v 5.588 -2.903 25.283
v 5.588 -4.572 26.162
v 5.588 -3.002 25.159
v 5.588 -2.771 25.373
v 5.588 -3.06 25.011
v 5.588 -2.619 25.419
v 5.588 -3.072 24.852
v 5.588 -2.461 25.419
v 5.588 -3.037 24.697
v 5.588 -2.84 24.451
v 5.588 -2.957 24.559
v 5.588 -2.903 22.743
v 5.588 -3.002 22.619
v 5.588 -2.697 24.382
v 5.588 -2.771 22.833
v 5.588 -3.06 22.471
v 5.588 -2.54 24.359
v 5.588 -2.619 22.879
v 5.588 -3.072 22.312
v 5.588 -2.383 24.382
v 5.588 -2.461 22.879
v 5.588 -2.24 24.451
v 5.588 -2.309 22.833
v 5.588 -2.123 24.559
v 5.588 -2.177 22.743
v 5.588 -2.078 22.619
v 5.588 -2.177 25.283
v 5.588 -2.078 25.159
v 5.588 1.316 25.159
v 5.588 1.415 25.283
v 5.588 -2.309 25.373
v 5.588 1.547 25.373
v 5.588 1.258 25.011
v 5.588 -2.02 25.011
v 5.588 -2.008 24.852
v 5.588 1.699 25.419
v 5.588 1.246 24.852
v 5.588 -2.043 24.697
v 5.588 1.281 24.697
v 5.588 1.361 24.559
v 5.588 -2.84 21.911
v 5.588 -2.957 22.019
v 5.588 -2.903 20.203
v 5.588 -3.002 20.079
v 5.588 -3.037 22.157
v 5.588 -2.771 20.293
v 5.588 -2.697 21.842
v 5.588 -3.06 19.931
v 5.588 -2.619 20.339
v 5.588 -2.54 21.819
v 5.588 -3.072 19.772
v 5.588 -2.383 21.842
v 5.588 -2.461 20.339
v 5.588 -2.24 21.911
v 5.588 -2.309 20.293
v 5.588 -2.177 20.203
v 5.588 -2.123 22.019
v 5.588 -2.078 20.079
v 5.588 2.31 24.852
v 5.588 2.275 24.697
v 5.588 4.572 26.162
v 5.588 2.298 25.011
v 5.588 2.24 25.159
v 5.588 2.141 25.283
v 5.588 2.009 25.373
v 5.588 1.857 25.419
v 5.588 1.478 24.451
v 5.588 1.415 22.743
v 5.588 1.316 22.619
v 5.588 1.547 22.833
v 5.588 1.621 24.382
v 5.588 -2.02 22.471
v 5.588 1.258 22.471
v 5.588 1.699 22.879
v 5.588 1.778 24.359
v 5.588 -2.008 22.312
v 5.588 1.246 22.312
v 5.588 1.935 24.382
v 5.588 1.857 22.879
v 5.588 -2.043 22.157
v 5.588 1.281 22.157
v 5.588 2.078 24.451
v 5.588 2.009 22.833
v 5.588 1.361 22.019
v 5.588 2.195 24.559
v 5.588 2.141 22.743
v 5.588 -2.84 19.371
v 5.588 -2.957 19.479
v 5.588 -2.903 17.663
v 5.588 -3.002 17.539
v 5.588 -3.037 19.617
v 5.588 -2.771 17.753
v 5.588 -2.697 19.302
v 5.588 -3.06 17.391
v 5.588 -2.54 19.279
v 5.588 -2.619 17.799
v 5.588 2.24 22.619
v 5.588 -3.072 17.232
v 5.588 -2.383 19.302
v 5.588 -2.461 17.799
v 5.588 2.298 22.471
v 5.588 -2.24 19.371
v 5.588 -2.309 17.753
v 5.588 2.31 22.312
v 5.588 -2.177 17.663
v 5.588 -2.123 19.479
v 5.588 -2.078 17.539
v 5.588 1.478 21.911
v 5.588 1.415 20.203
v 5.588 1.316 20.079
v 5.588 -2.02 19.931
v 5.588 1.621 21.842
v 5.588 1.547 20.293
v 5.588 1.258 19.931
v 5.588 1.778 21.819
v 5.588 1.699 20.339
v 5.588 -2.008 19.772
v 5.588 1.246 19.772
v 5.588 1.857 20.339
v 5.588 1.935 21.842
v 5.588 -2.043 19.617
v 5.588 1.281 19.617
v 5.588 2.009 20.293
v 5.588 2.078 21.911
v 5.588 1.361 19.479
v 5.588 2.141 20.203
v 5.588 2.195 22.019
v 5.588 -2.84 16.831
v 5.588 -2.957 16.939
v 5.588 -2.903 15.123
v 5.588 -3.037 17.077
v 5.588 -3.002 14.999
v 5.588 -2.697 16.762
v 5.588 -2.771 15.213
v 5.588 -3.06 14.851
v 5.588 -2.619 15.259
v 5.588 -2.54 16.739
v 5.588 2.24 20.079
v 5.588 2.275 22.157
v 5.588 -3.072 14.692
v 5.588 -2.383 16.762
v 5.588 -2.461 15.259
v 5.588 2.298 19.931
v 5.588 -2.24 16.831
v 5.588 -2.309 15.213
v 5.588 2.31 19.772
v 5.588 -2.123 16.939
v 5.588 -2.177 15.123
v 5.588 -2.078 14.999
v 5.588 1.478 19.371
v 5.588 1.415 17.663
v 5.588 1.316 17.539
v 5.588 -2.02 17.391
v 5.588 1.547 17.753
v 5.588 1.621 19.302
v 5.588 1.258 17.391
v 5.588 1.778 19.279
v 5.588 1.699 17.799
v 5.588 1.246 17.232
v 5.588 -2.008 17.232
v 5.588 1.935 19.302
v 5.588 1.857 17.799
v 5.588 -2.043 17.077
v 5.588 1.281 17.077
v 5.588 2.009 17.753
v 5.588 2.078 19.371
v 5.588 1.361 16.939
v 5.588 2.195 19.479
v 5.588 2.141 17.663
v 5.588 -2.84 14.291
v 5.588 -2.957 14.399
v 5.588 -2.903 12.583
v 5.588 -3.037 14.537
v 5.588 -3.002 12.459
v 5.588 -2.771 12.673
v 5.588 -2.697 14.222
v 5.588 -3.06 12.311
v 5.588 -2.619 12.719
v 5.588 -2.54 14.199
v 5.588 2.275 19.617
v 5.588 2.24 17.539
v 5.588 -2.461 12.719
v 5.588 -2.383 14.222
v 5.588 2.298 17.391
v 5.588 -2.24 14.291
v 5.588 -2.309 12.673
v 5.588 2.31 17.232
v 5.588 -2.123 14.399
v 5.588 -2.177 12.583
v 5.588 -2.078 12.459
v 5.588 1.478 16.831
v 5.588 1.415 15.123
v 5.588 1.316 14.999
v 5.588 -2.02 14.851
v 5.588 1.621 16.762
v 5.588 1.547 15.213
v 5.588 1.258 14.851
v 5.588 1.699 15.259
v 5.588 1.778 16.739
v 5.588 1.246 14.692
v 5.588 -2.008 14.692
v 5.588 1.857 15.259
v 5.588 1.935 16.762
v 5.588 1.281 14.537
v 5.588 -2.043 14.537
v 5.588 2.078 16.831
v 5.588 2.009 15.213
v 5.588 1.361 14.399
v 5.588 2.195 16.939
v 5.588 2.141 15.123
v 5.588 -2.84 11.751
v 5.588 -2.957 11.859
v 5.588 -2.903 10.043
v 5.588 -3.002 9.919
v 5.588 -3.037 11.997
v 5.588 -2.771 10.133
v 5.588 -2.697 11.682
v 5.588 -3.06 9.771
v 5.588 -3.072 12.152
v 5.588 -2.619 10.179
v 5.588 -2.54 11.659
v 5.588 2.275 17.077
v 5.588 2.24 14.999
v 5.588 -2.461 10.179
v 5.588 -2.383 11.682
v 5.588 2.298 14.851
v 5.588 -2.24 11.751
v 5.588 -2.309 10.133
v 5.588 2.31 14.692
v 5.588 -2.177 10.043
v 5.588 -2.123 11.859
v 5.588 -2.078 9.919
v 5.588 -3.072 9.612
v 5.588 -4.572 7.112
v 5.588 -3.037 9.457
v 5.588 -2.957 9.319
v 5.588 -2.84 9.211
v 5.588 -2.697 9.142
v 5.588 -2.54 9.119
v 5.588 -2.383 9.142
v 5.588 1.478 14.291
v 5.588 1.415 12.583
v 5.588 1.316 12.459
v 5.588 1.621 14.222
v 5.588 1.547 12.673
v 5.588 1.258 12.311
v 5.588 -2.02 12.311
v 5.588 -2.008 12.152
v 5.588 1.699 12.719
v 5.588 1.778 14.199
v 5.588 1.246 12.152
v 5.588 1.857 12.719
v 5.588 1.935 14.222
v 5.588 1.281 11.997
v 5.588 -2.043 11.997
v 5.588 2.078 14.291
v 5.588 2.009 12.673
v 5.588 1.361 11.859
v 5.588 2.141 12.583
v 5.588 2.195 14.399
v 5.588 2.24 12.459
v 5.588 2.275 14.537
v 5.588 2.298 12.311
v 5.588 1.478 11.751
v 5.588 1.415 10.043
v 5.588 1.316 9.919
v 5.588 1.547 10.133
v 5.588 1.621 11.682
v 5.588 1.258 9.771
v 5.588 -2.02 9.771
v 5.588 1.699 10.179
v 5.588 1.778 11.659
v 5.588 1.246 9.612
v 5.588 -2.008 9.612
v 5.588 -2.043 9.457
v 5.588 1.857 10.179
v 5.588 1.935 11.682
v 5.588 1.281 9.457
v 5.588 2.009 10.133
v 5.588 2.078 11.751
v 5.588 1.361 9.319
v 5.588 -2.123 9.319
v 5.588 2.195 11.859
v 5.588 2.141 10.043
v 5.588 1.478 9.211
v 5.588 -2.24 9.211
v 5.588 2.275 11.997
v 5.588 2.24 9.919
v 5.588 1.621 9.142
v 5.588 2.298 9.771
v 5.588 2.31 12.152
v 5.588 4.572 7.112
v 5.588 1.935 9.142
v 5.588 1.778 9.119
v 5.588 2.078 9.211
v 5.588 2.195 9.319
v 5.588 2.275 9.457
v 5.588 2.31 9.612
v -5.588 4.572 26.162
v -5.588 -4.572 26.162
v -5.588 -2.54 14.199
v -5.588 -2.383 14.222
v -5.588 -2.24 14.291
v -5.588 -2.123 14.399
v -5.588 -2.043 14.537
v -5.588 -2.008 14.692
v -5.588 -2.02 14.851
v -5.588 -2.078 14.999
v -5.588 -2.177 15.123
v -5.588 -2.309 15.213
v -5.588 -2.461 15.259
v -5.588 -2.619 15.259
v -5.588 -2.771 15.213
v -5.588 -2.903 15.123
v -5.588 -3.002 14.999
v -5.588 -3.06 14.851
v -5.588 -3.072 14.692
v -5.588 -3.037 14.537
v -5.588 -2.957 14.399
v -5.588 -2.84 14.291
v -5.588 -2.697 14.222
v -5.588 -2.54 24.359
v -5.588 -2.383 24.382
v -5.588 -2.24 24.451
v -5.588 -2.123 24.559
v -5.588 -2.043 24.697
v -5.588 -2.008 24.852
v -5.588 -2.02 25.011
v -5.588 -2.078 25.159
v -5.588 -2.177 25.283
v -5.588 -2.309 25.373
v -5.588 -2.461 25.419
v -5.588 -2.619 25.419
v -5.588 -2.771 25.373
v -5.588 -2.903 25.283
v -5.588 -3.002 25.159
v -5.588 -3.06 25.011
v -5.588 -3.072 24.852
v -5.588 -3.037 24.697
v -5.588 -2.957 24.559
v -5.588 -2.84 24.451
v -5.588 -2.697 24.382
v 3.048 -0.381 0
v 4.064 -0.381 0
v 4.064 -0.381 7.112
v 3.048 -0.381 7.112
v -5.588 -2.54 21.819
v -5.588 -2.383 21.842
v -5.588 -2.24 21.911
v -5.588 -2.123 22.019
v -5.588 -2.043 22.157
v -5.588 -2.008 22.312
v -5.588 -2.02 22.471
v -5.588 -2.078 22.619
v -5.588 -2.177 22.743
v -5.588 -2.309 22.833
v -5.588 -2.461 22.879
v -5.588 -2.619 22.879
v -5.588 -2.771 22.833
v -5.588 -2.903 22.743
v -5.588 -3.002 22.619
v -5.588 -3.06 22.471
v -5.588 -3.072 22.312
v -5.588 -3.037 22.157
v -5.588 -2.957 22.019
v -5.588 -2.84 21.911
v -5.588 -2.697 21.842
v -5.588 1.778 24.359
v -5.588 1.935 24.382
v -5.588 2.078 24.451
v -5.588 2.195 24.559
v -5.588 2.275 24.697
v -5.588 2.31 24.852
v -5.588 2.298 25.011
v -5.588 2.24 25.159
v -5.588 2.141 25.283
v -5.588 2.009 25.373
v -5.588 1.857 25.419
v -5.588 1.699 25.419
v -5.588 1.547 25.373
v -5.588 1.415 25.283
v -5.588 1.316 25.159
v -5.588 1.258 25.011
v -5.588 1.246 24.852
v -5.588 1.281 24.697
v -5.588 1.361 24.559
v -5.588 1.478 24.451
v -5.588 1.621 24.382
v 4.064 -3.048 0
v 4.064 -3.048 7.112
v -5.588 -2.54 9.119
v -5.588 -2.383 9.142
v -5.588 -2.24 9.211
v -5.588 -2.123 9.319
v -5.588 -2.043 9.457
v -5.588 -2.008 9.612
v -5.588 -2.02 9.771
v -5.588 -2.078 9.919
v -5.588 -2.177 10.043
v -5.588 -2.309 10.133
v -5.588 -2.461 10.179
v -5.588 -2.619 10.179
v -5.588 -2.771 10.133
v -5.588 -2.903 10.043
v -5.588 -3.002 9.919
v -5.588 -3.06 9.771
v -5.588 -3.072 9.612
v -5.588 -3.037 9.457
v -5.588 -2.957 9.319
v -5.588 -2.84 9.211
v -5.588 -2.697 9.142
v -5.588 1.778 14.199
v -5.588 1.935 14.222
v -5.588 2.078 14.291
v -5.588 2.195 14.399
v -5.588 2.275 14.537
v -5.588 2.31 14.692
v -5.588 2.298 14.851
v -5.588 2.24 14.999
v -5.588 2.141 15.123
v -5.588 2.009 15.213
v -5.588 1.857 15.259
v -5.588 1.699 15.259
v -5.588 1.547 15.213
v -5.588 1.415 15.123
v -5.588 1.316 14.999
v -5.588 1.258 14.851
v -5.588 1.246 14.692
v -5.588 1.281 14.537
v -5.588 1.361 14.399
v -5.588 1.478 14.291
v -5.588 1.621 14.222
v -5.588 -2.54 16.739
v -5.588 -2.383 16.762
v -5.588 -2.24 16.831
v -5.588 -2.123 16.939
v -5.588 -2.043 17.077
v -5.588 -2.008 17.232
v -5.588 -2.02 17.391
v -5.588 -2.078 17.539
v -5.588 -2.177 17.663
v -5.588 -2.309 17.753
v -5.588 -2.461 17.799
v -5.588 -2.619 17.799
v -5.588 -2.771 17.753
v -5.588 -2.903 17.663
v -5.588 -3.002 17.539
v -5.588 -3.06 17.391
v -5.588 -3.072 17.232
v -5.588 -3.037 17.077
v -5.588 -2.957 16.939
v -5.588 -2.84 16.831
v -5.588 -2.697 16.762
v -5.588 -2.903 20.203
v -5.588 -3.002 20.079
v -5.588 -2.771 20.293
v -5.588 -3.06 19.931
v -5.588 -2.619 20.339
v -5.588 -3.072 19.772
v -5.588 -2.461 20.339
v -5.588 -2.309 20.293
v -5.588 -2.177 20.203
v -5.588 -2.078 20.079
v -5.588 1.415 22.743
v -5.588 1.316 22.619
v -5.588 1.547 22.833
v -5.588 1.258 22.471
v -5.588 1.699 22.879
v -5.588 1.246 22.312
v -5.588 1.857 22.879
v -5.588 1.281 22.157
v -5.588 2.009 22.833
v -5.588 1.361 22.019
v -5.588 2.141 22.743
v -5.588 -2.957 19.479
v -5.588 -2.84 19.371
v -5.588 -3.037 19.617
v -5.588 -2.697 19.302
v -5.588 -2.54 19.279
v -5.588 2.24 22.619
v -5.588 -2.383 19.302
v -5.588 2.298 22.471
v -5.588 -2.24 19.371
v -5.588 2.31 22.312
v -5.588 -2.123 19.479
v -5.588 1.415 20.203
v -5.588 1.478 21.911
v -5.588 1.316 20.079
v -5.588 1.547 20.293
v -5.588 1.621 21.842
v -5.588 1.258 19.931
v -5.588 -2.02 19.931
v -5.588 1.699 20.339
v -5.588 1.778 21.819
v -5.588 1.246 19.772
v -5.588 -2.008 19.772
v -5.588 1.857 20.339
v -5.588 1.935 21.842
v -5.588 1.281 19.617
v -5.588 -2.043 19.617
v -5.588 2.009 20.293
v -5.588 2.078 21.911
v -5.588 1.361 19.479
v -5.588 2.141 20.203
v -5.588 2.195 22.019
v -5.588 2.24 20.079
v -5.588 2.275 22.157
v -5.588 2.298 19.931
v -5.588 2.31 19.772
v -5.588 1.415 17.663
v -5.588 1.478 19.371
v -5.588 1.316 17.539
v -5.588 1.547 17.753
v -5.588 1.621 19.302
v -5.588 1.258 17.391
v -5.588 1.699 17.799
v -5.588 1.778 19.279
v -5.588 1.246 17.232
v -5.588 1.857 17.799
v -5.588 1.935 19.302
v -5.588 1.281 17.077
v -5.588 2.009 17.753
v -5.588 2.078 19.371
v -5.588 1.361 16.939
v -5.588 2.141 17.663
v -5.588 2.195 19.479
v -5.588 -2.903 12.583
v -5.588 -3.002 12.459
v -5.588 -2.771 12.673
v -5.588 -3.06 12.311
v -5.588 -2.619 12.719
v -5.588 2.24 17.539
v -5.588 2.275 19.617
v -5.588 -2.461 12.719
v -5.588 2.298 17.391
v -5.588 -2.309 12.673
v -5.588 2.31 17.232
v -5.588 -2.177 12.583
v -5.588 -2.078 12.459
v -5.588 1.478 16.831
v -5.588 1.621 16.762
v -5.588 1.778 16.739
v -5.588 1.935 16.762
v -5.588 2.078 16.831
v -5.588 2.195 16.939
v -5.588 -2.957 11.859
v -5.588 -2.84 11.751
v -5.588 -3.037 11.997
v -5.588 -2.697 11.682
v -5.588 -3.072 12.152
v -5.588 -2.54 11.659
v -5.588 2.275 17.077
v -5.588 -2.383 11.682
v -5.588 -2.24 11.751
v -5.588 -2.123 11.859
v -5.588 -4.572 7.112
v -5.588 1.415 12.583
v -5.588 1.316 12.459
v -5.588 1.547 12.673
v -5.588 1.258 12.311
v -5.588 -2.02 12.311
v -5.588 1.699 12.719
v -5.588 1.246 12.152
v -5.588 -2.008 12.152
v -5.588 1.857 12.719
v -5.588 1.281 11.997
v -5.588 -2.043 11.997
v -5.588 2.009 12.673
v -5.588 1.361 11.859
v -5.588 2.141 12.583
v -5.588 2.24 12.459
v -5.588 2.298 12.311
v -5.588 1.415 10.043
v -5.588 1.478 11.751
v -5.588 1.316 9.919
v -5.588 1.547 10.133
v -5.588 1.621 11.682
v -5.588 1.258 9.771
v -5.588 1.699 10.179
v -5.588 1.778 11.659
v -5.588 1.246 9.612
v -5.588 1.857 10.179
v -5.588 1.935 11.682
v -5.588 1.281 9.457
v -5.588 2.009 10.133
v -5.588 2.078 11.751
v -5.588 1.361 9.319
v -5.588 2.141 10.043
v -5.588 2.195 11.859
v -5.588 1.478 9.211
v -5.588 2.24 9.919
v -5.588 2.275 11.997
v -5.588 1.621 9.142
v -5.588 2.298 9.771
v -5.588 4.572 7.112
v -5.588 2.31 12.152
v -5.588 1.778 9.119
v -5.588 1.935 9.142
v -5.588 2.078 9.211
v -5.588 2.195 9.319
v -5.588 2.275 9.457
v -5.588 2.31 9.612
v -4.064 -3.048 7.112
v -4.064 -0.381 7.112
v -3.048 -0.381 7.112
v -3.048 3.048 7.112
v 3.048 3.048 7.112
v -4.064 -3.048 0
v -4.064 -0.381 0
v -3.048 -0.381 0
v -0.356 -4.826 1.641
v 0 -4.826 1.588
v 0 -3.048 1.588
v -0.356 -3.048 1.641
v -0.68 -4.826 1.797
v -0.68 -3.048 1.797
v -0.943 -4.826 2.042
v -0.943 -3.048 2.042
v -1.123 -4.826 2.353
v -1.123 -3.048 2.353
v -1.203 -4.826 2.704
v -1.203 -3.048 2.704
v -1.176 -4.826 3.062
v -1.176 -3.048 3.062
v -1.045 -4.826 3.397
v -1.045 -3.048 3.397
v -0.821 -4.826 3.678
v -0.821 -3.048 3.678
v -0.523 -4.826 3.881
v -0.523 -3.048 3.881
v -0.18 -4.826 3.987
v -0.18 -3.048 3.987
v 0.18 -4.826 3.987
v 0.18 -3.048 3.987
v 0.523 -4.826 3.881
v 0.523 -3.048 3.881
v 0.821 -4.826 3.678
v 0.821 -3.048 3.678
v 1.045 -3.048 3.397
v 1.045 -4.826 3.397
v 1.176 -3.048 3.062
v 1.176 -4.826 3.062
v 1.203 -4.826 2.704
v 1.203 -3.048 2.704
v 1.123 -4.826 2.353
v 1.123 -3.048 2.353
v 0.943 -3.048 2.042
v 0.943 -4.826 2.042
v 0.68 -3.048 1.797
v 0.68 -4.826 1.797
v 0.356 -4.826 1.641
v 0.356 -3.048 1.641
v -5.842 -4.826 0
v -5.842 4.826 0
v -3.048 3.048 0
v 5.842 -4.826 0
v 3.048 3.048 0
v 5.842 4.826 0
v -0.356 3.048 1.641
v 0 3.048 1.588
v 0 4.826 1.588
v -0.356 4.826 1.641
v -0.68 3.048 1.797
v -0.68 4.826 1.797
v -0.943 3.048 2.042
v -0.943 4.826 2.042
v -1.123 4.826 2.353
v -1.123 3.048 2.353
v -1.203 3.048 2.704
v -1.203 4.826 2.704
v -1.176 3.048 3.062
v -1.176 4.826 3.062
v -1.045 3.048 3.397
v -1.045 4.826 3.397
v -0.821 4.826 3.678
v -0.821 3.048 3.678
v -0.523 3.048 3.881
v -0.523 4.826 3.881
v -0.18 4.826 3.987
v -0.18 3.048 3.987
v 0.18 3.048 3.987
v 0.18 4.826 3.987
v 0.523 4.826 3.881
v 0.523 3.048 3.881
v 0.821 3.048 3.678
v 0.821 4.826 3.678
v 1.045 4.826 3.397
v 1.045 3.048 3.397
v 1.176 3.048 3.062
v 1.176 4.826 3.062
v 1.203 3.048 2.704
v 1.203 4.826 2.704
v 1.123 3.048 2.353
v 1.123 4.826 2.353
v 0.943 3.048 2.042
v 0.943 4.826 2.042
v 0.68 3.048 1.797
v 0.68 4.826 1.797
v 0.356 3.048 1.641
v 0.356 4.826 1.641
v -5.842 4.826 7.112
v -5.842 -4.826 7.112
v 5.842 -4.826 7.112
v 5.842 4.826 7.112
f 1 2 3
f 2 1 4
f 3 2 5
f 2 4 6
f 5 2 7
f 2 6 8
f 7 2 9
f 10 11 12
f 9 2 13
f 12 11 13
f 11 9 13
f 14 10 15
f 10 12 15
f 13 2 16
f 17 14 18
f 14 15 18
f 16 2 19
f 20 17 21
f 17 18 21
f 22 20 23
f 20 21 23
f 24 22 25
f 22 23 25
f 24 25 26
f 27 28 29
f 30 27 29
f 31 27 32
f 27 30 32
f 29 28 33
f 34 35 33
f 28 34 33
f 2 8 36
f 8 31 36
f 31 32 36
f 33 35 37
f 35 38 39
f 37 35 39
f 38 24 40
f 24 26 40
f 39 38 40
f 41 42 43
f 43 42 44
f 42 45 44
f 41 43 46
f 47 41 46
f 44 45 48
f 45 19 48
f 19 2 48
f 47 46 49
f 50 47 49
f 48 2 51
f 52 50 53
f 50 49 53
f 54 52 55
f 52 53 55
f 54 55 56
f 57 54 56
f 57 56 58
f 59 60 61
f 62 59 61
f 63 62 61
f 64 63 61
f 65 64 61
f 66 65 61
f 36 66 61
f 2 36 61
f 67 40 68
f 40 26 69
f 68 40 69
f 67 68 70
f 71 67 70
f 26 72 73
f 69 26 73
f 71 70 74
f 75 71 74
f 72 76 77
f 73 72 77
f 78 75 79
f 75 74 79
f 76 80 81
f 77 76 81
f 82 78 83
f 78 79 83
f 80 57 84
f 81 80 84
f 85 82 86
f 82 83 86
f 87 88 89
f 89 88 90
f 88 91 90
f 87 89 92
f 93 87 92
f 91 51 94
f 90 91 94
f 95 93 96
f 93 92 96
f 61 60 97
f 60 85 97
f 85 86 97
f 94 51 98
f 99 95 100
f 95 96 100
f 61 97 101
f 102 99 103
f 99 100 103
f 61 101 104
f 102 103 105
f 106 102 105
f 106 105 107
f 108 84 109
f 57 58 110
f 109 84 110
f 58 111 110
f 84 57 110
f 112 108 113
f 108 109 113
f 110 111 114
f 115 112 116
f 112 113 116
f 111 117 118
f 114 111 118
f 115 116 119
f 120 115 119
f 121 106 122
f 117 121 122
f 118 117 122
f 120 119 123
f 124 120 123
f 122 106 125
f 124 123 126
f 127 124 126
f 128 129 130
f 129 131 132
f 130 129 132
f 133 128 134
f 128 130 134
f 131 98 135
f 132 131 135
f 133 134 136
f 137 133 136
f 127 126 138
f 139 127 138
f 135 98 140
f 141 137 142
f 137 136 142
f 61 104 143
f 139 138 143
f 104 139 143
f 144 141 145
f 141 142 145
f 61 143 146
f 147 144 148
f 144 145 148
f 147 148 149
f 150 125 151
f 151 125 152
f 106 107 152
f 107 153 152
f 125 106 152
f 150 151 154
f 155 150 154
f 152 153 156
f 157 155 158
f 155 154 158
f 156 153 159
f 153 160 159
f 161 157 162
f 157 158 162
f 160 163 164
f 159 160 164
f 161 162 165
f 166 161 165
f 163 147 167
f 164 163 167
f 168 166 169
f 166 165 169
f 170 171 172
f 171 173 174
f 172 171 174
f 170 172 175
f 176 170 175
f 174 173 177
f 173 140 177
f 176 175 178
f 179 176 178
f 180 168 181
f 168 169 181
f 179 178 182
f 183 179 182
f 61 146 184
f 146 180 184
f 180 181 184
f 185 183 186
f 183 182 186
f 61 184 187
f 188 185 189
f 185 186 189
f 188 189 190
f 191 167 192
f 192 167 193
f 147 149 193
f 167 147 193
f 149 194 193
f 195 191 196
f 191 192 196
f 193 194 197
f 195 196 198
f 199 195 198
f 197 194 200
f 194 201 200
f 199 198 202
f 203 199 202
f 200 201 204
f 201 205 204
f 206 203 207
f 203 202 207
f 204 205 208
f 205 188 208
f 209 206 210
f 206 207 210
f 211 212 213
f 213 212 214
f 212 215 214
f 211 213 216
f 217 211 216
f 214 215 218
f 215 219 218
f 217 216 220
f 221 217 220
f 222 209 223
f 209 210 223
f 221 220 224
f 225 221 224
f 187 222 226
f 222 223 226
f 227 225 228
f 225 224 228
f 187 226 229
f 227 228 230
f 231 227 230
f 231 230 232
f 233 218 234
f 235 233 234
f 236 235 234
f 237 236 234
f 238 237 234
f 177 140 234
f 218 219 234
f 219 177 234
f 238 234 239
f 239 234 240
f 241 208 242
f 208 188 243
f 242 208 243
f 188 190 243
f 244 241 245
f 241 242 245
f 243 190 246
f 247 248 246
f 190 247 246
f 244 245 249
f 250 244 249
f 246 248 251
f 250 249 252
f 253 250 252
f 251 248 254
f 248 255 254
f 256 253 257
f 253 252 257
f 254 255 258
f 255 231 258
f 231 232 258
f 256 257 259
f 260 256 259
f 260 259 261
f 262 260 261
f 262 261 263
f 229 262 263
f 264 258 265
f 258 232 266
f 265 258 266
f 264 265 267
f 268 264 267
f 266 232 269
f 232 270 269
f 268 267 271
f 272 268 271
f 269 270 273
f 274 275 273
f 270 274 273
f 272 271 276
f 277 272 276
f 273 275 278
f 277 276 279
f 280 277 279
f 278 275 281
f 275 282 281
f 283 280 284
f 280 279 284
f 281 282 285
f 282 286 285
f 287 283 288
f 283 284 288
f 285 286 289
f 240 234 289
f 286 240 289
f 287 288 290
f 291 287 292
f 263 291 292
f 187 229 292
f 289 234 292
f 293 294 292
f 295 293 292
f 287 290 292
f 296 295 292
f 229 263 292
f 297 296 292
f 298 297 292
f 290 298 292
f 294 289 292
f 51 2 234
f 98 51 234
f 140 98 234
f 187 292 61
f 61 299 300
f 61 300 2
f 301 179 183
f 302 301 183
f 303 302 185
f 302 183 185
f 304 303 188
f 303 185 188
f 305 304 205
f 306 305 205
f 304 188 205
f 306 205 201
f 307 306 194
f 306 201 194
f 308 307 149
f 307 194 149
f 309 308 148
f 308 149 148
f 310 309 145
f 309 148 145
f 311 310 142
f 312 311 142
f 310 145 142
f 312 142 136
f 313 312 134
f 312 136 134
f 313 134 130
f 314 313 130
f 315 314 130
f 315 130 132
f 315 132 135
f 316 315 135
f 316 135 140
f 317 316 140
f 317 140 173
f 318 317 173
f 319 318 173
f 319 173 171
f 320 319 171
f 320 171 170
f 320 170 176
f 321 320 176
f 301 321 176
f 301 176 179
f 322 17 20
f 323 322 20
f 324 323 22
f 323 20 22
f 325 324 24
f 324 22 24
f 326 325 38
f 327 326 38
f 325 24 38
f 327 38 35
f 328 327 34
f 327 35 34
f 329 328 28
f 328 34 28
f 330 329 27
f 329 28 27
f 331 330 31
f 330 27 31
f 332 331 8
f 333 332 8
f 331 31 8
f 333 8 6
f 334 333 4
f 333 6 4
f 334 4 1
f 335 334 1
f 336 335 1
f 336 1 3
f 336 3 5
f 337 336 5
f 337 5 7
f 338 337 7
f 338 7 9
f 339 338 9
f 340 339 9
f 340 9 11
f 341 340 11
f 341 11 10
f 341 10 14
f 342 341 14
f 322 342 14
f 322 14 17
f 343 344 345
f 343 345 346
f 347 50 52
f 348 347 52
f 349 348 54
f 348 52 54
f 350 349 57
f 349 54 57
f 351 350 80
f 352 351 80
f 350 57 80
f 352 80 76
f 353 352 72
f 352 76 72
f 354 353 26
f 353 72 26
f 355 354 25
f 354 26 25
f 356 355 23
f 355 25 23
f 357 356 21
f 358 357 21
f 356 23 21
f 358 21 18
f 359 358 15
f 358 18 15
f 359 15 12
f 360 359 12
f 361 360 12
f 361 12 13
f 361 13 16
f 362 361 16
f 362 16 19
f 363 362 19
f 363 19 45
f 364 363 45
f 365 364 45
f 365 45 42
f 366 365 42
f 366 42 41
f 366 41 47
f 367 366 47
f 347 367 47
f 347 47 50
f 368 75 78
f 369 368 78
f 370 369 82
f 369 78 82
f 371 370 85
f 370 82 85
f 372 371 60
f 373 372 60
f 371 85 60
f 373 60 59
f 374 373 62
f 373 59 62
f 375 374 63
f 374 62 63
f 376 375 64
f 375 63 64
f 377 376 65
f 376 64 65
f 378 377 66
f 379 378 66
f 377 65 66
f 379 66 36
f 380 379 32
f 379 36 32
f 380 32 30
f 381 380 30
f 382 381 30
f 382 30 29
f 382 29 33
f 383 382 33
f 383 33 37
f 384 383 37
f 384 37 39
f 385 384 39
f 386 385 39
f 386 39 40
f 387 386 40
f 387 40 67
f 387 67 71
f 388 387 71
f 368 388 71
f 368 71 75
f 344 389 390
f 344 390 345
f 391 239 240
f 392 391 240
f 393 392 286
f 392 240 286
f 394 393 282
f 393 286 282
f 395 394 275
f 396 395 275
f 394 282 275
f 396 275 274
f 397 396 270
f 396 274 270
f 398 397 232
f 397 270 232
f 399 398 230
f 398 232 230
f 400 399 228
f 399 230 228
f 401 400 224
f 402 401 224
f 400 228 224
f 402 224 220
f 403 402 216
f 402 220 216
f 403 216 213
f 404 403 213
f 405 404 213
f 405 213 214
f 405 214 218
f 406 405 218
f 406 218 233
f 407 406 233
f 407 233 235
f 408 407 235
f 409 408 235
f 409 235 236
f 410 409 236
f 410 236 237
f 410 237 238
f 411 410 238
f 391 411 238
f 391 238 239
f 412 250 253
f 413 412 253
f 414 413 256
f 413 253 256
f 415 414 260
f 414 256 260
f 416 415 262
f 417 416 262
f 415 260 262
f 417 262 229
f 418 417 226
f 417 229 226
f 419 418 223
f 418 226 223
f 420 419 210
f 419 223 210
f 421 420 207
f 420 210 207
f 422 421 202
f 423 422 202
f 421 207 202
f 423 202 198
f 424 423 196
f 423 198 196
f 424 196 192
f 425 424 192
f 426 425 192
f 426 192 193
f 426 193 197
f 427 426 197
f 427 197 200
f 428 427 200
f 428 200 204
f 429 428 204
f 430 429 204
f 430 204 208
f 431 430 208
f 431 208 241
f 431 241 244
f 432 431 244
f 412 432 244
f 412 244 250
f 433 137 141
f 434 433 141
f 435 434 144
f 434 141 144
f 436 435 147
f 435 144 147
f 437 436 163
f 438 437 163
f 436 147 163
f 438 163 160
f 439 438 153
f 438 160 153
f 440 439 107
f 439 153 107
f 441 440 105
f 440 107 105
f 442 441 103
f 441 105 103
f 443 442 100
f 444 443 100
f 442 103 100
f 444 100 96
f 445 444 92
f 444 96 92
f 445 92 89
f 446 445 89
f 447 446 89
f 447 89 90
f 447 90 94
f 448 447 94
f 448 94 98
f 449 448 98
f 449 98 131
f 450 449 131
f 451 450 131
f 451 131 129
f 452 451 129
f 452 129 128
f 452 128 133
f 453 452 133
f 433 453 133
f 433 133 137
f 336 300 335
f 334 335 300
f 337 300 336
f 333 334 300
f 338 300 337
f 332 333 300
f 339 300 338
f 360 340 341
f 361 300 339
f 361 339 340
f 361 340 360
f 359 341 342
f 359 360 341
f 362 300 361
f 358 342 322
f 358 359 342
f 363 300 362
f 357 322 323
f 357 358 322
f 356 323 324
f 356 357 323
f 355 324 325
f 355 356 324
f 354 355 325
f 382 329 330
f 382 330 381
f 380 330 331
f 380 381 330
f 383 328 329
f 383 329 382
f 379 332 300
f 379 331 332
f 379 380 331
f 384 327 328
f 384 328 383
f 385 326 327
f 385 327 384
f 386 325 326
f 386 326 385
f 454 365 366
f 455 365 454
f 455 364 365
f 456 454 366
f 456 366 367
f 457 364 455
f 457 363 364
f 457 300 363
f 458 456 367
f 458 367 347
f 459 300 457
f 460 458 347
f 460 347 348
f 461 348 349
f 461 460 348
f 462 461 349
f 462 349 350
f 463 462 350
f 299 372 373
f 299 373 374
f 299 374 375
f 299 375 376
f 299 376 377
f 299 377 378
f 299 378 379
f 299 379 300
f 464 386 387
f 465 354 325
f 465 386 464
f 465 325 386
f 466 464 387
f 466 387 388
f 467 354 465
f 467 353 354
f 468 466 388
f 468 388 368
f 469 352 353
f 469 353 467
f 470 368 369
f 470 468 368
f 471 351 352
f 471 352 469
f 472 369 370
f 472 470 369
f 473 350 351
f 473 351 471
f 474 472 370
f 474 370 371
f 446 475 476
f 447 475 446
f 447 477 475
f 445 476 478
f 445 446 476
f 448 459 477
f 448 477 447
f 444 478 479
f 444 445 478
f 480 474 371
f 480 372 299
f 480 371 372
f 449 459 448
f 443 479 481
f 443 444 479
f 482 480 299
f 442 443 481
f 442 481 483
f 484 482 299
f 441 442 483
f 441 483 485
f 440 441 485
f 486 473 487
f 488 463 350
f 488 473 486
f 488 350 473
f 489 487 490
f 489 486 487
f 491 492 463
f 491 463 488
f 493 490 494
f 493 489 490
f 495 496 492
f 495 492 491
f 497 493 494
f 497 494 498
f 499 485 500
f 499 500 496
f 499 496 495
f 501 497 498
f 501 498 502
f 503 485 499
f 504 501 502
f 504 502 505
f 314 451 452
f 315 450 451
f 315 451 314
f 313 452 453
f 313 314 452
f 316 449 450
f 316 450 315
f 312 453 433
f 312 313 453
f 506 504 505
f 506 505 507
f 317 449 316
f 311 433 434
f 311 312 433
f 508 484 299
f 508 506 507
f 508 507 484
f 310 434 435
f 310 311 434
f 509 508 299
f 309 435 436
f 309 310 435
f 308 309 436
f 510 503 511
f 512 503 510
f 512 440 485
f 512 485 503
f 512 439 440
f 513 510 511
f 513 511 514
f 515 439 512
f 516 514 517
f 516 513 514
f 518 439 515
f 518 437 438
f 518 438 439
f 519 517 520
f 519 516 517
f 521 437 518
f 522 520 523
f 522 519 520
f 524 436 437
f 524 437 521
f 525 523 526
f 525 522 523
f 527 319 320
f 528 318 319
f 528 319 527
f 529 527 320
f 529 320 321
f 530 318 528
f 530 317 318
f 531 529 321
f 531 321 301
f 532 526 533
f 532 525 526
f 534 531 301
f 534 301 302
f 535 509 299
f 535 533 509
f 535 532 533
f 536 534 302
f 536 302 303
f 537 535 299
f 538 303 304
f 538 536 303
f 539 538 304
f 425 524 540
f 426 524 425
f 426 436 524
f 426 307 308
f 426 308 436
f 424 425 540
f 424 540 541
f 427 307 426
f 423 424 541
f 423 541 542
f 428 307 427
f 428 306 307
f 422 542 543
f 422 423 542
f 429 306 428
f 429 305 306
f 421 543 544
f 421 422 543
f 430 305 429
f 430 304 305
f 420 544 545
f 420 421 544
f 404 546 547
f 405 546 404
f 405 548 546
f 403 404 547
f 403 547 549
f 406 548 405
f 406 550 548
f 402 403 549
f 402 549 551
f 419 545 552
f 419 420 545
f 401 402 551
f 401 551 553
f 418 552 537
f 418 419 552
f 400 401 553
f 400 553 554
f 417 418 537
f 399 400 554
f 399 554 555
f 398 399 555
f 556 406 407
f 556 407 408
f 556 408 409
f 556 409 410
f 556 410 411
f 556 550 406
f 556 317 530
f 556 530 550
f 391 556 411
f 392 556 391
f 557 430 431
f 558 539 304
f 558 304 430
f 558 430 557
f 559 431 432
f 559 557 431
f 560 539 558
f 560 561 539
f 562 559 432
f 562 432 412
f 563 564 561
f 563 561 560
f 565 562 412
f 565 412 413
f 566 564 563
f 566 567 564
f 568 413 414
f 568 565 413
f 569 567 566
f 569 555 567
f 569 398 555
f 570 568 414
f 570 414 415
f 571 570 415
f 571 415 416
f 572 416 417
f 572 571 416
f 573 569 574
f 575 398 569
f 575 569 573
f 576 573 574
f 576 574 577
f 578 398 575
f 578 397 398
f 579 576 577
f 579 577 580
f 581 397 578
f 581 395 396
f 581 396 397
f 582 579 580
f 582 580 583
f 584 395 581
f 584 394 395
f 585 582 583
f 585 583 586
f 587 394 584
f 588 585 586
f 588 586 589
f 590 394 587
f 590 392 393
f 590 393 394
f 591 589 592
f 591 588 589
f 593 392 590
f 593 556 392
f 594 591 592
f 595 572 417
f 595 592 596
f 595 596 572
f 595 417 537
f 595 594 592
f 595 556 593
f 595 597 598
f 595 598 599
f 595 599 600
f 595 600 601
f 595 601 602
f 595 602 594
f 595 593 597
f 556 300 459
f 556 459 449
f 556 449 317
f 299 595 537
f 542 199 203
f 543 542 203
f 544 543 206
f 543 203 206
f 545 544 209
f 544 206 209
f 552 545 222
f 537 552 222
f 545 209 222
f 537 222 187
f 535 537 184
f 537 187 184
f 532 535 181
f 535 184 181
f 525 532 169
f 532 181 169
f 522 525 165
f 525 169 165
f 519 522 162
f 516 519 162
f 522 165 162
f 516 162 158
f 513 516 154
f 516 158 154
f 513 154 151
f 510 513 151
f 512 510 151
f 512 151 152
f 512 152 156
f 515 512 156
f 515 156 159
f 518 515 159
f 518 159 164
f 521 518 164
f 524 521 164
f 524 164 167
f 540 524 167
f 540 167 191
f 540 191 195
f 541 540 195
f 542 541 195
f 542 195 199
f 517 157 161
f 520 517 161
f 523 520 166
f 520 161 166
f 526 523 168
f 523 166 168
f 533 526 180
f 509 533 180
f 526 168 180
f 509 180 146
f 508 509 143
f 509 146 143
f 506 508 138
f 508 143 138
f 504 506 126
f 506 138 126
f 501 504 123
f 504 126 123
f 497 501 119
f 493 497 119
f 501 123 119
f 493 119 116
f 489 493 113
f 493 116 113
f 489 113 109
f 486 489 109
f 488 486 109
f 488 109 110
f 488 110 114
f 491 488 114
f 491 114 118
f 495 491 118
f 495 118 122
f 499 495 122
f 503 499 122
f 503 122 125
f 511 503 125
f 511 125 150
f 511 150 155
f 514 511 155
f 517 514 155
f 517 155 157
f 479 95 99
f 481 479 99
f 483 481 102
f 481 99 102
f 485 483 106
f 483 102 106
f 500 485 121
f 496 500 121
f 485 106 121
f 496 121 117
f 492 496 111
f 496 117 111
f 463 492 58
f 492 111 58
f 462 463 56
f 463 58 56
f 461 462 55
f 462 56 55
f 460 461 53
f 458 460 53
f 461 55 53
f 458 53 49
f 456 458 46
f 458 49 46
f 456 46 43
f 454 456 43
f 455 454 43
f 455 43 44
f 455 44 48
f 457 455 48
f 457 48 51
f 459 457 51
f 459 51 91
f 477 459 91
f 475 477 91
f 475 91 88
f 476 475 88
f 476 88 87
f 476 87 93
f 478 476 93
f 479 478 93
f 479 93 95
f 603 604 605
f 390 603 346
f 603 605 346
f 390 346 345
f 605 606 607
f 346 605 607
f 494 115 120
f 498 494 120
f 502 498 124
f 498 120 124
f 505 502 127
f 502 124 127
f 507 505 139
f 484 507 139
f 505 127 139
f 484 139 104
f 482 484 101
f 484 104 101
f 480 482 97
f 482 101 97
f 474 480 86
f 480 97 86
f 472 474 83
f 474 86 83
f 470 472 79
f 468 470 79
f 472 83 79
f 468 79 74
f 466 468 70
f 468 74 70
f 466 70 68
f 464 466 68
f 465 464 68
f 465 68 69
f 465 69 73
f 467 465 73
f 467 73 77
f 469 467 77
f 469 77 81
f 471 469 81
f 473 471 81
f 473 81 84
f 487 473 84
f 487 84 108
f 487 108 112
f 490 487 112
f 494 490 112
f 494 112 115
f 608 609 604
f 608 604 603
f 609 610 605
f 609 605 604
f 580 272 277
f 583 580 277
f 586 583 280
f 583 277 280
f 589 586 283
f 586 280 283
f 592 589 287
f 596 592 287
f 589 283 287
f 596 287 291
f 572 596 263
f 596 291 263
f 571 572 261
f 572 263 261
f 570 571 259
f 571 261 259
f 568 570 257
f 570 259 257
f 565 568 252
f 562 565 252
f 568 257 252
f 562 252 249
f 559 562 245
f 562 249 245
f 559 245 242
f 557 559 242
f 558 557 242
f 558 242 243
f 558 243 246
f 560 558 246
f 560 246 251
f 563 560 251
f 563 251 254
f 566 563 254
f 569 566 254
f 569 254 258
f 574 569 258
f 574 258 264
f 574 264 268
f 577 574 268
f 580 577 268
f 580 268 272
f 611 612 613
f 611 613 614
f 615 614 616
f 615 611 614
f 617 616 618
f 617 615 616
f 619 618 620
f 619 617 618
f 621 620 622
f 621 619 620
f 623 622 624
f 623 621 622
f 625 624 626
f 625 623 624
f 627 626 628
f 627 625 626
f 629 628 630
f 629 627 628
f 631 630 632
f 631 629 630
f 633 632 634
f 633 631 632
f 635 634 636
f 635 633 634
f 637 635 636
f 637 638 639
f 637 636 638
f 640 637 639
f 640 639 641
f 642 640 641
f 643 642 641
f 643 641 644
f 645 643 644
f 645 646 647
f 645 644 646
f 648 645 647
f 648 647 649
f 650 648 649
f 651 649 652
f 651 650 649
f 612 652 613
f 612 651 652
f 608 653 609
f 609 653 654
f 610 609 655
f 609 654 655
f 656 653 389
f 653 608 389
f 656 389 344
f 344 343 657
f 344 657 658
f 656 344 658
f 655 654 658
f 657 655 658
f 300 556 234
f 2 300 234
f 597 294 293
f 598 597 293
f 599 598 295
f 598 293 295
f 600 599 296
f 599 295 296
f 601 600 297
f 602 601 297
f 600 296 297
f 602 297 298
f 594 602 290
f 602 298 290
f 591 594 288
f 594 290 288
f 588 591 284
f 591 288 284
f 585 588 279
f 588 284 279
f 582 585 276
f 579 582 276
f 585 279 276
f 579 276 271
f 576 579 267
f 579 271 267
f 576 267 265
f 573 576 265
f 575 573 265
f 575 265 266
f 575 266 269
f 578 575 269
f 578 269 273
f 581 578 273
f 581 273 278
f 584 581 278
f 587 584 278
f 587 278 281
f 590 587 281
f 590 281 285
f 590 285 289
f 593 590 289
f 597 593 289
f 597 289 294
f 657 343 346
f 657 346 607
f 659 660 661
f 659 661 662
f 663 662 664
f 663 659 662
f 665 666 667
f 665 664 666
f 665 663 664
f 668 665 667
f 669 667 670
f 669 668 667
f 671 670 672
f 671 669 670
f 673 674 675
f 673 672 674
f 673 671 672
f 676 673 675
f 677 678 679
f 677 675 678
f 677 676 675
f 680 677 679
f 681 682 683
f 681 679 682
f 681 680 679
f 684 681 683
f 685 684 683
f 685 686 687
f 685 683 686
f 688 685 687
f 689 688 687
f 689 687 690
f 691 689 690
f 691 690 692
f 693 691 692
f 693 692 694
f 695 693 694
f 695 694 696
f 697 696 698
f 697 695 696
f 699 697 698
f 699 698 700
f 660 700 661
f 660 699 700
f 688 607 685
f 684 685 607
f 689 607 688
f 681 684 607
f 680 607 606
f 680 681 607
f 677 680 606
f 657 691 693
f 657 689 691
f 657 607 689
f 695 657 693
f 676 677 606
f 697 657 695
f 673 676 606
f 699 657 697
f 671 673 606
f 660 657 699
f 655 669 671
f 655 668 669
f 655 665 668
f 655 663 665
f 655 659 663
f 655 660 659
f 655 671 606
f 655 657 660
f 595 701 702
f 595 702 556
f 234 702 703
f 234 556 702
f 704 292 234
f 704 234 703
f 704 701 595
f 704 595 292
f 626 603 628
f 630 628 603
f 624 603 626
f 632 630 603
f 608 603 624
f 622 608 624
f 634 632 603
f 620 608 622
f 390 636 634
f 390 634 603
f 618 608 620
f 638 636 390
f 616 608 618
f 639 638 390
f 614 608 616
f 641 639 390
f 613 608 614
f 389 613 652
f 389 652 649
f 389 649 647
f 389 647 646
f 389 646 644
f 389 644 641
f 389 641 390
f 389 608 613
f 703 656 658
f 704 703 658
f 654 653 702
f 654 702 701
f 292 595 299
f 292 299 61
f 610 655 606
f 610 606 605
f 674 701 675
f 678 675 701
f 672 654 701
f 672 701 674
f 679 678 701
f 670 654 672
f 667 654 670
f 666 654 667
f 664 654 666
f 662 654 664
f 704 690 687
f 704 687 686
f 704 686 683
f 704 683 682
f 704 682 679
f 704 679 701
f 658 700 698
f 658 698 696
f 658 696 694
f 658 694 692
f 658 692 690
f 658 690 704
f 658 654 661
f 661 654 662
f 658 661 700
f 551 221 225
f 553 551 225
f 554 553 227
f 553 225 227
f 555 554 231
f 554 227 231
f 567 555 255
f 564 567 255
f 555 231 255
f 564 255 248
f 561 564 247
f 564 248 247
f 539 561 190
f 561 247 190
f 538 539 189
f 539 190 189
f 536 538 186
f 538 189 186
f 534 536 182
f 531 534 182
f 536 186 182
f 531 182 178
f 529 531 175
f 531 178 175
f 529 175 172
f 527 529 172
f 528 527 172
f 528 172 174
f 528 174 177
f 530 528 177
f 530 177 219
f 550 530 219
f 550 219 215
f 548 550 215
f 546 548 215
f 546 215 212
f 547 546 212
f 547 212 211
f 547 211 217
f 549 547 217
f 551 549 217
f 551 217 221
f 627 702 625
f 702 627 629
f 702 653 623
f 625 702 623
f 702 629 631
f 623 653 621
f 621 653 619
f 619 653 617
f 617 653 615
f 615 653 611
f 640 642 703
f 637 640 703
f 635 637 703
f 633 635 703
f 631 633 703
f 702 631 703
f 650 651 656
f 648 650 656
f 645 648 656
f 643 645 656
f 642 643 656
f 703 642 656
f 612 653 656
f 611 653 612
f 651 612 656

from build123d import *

# Parameters (mm, degrees)
SKETCH1_W               = 11.684
SKETCH1_H               = 9.652
BOSS_EXTRUDE1_DEPTH     = 7.112
CUT_EXTRUDE1_DEPTH      = 14.336814162
CUT_EXTRUDE1_DEPTH_BACK = 14.336814162
SKETCH2_R               = 1.2065
SKETCH7_W               = 11.176
SKETCH7_H               = 9.144
BOSS_EXTRUDE3_DEPTH     = 19.05
SKETCH9_R               = 0.5334
CUT_EXTRUDE2_DEPTH      = 29.954885943


with BuildPart() as part:
    # Sketch1 → Boss-Extrude1 (new body)
    with BuildSketch(Plane.XY):
        Rectangle(SKETCH1_W, SKETCH1_H)
        Polygon((-4.064, -3.048), (4.064, -3.048), (4.064, -0.381), (3.048, -0.381), (3.048, 3.048), (-3.048, 3.048), (-3.048, -0.381), (-4.064, -0.381), align=None, mode=Mode.SUBTRACT)
    extrude(amount=BOSS_EXTRUDE1_DEPTH)

    # Sketch2 → Cut-Extrude1 (cut, two sides: drawn at the far end of the back side and taken through both)
    with BuildSketch(Plane(origin=(0, 4.826, 0), x_dir=(1, 0, 0), z_dir=(0, 1, 0)).offset(-CUT_EXTRUDE1_DEPTH_BACK)):
        with Locations(Location((0, -2.794, 0), (0, 0, 90))):
            Circle(SKETCH2_R)
    extrude(amount=CUT_EXTRUDE1_DEPTH + CUT_EXTRUDE1_DEPTH_BACK, mode=Mode.SUBTRACT)

    # Sketch7 → Boss-Extrude3 (add)
    with BuildSketch(Plane.XY.offset(7.112)):
        Rectangle(SKETCH7_W, SKETCH7_H)
    extrude(amount=BOSS_EXTRUDE3_DEPTH)

    # Sketch9 → Cut-Extrude2 (cut, through all)
    with BuildSketch(Plane(origin=(5.588, 0, 0), x_dir=(0, 0, -1), z_dir=(1, 0, 0))):
        with Locations((-9.652, -2.54)):
            Circle(SKETCH9_R)
        with Locations((-12.192, -2.54)):
            Circle(SKETCH9_R)
        with Locations((-14.732, -2.54)):
            Circle(SKETCH9_R)
        with Locations((-17.272, -2.54)):
            Circle(SKETCH9_R)
        with Locations((-19.812, -2.54)):
            Circle(SKETCH9_R)
        with Locations((-22.352, -2.54)):
            Circle(SKETCH9_R)
        with Locations((-24.892, -2.54)):
            Circle(SKETCH9_R)
        with Locations((-12.192, 1.778)):
            Circle(SKETCH9_R)
        with Locations((-14.732, 1.778)):
            Circle(SKETCH9_R)
        with Locations((-17.272, 1.778)):
            Circle(SKETCH9_R)
        with Locations((-19.812, 1.778)):
            Circle(SKETCH9_R)
        with Locations((-22.352, 1.778)):
            Circle(SKETCH9_R)
        with Locations((-24.892, 1.778)):
            Circle(SKETCH9_R)
        with Locations((-9.652, 1.778)):
            Circle(SKETCH9_R)
    extrude(amount=-CUT_EXTRUDE2_DEPTH, mode=Mode.SUBTRACT)


solid = part.part
